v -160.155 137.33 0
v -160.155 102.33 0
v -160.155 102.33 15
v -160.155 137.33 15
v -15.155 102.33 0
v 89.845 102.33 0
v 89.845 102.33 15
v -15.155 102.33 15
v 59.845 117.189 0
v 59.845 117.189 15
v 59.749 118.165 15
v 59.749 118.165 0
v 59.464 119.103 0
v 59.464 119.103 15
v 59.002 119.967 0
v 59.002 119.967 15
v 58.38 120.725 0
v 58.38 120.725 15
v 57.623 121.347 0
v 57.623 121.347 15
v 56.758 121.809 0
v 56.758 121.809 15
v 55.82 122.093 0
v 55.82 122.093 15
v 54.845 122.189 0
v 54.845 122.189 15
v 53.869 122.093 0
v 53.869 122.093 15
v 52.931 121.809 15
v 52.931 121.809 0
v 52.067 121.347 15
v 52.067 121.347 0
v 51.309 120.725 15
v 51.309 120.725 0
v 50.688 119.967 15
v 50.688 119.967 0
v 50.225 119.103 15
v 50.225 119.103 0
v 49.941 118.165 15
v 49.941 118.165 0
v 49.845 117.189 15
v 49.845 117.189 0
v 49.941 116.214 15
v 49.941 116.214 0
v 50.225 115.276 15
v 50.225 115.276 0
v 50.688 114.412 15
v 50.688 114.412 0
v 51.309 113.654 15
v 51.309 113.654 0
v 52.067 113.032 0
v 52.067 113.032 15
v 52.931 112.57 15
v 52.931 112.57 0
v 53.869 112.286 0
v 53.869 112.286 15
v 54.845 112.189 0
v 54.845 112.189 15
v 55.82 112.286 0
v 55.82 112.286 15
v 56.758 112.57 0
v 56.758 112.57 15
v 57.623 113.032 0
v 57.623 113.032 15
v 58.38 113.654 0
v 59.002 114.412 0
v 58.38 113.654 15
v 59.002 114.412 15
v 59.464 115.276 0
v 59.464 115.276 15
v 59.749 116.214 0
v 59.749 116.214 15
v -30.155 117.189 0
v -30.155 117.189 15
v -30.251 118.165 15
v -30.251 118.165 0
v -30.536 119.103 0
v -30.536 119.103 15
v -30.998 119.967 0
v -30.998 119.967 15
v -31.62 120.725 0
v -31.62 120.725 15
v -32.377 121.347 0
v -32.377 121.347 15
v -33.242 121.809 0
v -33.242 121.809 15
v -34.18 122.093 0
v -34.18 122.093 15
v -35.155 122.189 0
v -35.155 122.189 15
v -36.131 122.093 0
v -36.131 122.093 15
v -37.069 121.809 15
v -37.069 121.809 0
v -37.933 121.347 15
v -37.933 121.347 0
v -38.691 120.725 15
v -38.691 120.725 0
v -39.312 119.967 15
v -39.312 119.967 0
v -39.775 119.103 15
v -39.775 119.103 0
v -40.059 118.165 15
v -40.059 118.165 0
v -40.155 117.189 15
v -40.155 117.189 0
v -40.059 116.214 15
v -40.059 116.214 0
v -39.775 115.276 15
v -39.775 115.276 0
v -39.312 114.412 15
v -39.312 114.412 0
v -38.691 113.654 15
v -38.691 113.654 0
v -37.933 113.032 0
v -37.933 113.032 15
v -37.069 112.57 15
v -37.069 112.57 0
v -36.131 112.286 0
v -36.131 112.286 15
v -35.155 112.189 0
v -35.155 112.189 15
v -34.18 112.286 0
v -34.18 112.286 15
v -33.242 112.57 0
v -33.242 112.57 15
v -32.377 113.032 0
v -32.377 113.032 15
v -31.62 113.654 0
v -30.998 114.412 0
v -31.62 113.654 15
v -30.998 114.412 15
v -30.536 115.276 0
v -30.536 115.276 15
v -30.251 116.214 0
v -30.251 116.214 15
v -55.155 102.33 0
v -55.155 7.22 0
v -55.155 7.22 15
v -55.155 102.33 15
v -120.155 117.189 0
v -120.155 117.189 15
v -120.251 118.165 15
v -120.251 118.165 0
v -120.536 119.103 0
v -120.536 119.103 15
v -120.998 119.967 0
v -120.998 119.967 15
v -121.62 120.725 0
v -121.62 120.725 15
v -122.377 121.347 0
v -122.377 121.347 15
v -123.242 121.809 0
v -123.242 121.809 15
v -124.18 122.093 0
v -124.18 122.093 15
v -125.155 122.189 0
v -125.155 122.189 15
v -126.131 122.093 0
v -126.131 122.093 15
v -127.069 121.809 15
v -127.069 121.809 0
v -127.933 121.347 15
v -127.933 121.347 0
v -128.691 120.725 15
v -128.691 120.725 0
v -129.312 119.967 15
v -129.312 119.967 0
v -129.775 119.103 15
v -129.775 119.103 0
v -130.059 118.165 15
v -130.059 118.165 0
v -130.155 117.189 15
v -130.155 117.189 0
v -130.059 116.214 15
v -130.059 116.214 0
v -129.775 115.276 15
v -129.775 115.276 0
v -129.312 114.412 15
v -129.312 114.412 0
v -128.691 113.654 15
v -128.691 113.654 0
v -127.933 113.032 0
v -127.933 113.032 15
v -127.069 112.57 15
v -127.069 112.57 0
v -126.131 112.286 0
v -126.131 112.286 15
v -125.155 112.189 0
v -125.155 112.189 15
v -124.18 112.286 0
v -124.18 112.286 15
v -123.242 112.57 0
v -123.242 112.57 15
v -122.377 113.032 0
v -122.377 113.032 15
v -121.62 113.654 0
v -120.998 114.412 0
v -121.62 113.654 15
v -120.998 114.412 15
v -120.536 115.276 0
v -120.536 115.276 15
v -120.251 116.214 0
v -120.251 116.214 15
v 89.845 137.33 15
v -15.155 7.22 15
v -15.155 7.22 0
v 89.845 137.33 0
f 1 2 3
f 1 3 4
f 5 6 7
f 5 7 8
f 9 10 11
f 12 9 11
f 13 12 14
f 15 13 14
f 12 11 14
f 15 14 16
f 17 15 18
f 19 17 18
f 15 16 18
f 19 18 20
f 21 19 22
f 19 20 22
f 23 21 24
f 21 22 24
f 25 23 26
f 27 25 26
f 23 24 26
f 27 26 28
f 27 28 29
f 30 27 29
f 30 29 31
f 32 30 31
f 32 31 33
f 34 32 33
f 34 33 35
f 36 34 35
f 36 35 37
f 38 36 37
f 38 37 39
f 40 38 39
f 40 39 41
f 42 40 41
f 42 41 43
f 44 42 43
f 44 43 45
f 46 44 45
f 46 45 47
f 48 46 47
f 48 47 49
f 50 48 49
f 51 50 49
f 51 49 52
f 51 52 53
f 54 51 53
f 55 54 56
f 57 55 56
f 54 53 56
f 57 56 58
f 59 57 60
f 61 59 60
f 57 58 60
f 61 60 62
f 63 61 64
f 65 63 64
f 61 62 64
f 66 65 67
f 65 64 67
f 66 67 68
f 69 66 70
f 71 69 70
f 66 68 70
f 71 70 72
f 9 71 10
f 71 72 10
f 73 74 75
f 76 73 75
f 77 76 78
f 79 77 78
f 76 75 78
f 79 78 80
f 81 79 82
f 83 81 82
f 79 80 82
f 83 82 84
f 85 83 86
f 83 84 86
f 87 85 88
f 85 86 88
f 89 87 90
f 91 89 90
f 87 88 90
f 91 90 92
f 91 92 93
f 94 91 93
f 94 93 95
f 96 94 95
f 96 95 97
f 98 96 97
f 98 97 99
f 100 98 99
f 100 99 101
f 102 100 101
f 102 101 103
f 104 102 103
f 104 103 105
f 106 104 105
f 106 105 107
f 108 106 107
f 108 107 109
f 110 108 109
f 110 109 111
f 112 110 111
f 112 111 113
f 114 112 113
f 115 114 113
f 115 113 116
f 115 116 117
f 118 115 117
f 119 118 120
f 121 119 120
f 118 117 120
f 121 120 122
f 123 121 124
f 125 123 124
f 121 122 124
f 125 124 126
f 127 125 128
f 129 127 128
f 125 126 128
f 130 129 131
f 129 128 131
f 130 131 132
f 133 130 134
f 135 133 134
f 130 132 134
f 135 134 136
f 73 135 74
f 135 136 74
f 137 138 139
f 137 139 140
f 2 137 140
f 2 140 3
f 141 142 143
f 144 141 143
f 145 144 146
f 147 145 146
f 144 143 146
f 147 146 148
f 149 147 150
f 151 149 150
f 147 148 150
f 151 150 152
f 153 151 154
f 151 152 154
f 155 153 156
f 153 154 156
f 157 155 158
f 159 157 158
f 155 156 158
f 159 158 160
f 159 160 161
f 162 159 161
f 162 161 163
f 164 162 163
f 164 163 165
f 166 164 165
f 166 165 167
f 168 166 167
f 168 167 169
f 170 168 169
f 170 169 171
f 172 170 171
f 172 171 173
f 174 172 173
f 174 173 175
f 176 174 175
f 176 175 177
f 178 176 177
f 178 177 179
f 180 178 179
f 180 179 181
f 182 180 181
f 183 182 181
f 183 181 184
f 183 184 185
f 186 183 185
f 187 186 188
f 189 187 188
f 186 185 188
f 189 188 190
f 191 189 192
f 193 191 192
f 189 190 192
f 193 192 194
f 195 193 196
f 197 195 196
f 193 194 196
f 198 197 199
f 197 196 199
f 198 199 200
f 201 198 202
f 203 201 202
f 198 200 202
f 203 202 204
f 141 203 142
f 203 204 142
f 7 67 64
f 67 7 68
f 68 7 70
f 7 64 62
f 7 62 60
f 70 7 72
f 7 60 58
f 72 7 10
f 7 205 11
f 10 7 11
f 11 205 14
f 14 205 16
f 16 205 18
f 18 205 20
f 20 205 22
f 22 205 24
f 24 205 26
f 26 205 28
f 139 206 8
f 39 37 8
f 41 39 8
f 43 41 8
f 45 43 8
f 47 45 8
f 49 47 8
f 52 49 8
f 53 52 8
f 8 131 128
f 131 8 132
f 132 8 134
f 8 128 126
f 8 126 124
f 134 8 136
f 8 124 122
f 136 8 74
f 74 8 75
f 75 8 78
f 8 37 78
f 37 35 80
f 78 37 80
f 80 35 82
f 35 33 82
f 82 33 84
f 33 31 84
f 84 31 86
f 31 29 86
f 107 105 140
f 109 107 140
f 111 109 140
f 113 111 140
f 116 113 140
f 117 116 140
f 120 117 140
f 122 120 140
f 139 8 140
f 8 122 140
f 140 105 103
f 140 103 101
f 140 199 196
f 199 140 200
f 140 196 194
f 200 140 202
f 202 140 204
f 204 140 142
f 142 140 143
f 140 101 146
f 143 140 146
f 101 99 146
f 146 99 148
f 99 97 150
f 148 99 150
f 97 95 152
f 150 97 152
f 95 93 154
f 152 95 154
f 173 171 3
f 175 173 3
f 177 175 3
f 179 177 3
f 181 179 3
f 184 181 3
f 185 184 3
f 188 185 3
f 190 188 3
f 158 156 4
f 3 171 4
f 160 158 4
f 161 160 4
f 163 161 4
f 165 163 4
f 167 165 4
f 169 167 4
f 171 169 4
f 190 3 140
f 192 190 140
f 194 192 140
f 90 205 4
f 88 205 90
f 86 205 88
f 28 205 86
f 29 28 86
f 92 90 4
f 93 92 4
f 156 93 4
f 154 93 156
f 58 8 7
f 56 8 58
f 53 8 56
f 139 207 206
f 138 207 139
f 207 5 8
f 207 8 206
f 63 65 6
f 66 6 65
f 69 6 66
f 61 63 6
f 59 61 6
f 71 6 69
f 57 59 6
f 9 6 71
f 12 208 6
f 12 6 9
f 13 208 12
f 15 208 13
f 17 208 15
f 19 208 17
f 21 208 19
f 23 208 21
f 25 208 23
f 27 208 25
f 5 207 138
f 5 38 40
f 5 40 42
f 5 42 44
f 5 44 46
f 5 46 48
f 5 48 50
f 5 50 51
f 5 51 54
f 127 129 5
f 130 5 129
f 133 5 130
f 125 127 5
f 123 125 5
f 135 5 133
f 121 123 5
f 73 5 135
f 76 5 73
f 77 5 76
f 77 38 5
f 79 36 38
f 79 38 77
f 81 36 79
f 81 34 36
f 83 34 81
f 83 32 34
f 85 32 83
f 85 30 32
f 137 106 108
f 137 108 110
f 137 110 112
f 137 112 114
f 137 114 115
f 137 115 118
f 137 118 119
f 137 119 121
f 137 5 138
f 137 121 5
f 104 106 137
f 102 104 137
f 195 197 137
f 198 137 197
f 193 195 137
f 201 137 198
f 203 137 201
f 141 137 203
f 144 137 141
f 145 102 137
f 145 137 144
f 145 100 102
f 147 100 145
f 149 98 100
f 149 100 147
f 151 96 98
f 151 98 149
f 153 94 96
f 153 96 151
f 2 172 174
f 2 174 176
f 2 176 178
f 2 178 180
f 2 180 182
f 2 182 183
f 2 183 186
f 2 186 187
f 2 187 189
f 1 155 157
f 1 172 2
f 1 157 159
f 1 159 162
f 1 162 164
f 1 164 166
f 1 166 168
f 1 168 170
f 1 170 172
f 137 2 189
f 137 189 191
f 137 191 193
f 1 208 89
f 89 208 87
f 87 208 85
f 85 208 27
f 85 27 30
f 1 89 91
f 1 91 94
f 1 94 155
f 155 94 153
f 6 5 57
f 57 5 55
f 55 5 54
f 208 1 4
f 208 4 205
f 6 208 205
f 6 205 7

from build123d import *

# Parameters (mm, degrees)
EXTRUDE_1_DEPTH     = 15
SKETCH_2_R          = 5
CUT_EXTRUDE_1_DEPTH = 212.504412291


with BuildPart() as part:
    # 草圖1 → 填料-伸長1 (new body)
    with BuildSketch(Plane.XY):
        Polygon((-15.155141061, 7.219614063), (-55.155141061, 7.219614063), (-55.155141061, 102.329702578), (-160.155141061, 102.329702578), (-160.155141061, 137.329702578), (89.844858939, 137.329702578), (89.844858939, 102.329702578), (-15.155141061, 102.329702578), align=None)
    extrude(amount=EXTRUDE_1_DEPTH)

    # 草圖2 → 除料-伸長1 (cut, through all)
    with BuildSketch(Plane.XY.offset(15)):
        with Locations((54.844858939, 117.189491535)):
            Circle(SKETCH_2_R)
        with Locations((-35.155141061, 117.189491535)):
            Circle(SKETCH_2_R)
        with Locations((-125.155141061, 117.189491535)):
            Circle(SKETCH_2_R)
    extrude(amount=-CUT_EXTRUDE_1_DEPTH, mode=Mode.SUBTRACT)


solid = part.part
